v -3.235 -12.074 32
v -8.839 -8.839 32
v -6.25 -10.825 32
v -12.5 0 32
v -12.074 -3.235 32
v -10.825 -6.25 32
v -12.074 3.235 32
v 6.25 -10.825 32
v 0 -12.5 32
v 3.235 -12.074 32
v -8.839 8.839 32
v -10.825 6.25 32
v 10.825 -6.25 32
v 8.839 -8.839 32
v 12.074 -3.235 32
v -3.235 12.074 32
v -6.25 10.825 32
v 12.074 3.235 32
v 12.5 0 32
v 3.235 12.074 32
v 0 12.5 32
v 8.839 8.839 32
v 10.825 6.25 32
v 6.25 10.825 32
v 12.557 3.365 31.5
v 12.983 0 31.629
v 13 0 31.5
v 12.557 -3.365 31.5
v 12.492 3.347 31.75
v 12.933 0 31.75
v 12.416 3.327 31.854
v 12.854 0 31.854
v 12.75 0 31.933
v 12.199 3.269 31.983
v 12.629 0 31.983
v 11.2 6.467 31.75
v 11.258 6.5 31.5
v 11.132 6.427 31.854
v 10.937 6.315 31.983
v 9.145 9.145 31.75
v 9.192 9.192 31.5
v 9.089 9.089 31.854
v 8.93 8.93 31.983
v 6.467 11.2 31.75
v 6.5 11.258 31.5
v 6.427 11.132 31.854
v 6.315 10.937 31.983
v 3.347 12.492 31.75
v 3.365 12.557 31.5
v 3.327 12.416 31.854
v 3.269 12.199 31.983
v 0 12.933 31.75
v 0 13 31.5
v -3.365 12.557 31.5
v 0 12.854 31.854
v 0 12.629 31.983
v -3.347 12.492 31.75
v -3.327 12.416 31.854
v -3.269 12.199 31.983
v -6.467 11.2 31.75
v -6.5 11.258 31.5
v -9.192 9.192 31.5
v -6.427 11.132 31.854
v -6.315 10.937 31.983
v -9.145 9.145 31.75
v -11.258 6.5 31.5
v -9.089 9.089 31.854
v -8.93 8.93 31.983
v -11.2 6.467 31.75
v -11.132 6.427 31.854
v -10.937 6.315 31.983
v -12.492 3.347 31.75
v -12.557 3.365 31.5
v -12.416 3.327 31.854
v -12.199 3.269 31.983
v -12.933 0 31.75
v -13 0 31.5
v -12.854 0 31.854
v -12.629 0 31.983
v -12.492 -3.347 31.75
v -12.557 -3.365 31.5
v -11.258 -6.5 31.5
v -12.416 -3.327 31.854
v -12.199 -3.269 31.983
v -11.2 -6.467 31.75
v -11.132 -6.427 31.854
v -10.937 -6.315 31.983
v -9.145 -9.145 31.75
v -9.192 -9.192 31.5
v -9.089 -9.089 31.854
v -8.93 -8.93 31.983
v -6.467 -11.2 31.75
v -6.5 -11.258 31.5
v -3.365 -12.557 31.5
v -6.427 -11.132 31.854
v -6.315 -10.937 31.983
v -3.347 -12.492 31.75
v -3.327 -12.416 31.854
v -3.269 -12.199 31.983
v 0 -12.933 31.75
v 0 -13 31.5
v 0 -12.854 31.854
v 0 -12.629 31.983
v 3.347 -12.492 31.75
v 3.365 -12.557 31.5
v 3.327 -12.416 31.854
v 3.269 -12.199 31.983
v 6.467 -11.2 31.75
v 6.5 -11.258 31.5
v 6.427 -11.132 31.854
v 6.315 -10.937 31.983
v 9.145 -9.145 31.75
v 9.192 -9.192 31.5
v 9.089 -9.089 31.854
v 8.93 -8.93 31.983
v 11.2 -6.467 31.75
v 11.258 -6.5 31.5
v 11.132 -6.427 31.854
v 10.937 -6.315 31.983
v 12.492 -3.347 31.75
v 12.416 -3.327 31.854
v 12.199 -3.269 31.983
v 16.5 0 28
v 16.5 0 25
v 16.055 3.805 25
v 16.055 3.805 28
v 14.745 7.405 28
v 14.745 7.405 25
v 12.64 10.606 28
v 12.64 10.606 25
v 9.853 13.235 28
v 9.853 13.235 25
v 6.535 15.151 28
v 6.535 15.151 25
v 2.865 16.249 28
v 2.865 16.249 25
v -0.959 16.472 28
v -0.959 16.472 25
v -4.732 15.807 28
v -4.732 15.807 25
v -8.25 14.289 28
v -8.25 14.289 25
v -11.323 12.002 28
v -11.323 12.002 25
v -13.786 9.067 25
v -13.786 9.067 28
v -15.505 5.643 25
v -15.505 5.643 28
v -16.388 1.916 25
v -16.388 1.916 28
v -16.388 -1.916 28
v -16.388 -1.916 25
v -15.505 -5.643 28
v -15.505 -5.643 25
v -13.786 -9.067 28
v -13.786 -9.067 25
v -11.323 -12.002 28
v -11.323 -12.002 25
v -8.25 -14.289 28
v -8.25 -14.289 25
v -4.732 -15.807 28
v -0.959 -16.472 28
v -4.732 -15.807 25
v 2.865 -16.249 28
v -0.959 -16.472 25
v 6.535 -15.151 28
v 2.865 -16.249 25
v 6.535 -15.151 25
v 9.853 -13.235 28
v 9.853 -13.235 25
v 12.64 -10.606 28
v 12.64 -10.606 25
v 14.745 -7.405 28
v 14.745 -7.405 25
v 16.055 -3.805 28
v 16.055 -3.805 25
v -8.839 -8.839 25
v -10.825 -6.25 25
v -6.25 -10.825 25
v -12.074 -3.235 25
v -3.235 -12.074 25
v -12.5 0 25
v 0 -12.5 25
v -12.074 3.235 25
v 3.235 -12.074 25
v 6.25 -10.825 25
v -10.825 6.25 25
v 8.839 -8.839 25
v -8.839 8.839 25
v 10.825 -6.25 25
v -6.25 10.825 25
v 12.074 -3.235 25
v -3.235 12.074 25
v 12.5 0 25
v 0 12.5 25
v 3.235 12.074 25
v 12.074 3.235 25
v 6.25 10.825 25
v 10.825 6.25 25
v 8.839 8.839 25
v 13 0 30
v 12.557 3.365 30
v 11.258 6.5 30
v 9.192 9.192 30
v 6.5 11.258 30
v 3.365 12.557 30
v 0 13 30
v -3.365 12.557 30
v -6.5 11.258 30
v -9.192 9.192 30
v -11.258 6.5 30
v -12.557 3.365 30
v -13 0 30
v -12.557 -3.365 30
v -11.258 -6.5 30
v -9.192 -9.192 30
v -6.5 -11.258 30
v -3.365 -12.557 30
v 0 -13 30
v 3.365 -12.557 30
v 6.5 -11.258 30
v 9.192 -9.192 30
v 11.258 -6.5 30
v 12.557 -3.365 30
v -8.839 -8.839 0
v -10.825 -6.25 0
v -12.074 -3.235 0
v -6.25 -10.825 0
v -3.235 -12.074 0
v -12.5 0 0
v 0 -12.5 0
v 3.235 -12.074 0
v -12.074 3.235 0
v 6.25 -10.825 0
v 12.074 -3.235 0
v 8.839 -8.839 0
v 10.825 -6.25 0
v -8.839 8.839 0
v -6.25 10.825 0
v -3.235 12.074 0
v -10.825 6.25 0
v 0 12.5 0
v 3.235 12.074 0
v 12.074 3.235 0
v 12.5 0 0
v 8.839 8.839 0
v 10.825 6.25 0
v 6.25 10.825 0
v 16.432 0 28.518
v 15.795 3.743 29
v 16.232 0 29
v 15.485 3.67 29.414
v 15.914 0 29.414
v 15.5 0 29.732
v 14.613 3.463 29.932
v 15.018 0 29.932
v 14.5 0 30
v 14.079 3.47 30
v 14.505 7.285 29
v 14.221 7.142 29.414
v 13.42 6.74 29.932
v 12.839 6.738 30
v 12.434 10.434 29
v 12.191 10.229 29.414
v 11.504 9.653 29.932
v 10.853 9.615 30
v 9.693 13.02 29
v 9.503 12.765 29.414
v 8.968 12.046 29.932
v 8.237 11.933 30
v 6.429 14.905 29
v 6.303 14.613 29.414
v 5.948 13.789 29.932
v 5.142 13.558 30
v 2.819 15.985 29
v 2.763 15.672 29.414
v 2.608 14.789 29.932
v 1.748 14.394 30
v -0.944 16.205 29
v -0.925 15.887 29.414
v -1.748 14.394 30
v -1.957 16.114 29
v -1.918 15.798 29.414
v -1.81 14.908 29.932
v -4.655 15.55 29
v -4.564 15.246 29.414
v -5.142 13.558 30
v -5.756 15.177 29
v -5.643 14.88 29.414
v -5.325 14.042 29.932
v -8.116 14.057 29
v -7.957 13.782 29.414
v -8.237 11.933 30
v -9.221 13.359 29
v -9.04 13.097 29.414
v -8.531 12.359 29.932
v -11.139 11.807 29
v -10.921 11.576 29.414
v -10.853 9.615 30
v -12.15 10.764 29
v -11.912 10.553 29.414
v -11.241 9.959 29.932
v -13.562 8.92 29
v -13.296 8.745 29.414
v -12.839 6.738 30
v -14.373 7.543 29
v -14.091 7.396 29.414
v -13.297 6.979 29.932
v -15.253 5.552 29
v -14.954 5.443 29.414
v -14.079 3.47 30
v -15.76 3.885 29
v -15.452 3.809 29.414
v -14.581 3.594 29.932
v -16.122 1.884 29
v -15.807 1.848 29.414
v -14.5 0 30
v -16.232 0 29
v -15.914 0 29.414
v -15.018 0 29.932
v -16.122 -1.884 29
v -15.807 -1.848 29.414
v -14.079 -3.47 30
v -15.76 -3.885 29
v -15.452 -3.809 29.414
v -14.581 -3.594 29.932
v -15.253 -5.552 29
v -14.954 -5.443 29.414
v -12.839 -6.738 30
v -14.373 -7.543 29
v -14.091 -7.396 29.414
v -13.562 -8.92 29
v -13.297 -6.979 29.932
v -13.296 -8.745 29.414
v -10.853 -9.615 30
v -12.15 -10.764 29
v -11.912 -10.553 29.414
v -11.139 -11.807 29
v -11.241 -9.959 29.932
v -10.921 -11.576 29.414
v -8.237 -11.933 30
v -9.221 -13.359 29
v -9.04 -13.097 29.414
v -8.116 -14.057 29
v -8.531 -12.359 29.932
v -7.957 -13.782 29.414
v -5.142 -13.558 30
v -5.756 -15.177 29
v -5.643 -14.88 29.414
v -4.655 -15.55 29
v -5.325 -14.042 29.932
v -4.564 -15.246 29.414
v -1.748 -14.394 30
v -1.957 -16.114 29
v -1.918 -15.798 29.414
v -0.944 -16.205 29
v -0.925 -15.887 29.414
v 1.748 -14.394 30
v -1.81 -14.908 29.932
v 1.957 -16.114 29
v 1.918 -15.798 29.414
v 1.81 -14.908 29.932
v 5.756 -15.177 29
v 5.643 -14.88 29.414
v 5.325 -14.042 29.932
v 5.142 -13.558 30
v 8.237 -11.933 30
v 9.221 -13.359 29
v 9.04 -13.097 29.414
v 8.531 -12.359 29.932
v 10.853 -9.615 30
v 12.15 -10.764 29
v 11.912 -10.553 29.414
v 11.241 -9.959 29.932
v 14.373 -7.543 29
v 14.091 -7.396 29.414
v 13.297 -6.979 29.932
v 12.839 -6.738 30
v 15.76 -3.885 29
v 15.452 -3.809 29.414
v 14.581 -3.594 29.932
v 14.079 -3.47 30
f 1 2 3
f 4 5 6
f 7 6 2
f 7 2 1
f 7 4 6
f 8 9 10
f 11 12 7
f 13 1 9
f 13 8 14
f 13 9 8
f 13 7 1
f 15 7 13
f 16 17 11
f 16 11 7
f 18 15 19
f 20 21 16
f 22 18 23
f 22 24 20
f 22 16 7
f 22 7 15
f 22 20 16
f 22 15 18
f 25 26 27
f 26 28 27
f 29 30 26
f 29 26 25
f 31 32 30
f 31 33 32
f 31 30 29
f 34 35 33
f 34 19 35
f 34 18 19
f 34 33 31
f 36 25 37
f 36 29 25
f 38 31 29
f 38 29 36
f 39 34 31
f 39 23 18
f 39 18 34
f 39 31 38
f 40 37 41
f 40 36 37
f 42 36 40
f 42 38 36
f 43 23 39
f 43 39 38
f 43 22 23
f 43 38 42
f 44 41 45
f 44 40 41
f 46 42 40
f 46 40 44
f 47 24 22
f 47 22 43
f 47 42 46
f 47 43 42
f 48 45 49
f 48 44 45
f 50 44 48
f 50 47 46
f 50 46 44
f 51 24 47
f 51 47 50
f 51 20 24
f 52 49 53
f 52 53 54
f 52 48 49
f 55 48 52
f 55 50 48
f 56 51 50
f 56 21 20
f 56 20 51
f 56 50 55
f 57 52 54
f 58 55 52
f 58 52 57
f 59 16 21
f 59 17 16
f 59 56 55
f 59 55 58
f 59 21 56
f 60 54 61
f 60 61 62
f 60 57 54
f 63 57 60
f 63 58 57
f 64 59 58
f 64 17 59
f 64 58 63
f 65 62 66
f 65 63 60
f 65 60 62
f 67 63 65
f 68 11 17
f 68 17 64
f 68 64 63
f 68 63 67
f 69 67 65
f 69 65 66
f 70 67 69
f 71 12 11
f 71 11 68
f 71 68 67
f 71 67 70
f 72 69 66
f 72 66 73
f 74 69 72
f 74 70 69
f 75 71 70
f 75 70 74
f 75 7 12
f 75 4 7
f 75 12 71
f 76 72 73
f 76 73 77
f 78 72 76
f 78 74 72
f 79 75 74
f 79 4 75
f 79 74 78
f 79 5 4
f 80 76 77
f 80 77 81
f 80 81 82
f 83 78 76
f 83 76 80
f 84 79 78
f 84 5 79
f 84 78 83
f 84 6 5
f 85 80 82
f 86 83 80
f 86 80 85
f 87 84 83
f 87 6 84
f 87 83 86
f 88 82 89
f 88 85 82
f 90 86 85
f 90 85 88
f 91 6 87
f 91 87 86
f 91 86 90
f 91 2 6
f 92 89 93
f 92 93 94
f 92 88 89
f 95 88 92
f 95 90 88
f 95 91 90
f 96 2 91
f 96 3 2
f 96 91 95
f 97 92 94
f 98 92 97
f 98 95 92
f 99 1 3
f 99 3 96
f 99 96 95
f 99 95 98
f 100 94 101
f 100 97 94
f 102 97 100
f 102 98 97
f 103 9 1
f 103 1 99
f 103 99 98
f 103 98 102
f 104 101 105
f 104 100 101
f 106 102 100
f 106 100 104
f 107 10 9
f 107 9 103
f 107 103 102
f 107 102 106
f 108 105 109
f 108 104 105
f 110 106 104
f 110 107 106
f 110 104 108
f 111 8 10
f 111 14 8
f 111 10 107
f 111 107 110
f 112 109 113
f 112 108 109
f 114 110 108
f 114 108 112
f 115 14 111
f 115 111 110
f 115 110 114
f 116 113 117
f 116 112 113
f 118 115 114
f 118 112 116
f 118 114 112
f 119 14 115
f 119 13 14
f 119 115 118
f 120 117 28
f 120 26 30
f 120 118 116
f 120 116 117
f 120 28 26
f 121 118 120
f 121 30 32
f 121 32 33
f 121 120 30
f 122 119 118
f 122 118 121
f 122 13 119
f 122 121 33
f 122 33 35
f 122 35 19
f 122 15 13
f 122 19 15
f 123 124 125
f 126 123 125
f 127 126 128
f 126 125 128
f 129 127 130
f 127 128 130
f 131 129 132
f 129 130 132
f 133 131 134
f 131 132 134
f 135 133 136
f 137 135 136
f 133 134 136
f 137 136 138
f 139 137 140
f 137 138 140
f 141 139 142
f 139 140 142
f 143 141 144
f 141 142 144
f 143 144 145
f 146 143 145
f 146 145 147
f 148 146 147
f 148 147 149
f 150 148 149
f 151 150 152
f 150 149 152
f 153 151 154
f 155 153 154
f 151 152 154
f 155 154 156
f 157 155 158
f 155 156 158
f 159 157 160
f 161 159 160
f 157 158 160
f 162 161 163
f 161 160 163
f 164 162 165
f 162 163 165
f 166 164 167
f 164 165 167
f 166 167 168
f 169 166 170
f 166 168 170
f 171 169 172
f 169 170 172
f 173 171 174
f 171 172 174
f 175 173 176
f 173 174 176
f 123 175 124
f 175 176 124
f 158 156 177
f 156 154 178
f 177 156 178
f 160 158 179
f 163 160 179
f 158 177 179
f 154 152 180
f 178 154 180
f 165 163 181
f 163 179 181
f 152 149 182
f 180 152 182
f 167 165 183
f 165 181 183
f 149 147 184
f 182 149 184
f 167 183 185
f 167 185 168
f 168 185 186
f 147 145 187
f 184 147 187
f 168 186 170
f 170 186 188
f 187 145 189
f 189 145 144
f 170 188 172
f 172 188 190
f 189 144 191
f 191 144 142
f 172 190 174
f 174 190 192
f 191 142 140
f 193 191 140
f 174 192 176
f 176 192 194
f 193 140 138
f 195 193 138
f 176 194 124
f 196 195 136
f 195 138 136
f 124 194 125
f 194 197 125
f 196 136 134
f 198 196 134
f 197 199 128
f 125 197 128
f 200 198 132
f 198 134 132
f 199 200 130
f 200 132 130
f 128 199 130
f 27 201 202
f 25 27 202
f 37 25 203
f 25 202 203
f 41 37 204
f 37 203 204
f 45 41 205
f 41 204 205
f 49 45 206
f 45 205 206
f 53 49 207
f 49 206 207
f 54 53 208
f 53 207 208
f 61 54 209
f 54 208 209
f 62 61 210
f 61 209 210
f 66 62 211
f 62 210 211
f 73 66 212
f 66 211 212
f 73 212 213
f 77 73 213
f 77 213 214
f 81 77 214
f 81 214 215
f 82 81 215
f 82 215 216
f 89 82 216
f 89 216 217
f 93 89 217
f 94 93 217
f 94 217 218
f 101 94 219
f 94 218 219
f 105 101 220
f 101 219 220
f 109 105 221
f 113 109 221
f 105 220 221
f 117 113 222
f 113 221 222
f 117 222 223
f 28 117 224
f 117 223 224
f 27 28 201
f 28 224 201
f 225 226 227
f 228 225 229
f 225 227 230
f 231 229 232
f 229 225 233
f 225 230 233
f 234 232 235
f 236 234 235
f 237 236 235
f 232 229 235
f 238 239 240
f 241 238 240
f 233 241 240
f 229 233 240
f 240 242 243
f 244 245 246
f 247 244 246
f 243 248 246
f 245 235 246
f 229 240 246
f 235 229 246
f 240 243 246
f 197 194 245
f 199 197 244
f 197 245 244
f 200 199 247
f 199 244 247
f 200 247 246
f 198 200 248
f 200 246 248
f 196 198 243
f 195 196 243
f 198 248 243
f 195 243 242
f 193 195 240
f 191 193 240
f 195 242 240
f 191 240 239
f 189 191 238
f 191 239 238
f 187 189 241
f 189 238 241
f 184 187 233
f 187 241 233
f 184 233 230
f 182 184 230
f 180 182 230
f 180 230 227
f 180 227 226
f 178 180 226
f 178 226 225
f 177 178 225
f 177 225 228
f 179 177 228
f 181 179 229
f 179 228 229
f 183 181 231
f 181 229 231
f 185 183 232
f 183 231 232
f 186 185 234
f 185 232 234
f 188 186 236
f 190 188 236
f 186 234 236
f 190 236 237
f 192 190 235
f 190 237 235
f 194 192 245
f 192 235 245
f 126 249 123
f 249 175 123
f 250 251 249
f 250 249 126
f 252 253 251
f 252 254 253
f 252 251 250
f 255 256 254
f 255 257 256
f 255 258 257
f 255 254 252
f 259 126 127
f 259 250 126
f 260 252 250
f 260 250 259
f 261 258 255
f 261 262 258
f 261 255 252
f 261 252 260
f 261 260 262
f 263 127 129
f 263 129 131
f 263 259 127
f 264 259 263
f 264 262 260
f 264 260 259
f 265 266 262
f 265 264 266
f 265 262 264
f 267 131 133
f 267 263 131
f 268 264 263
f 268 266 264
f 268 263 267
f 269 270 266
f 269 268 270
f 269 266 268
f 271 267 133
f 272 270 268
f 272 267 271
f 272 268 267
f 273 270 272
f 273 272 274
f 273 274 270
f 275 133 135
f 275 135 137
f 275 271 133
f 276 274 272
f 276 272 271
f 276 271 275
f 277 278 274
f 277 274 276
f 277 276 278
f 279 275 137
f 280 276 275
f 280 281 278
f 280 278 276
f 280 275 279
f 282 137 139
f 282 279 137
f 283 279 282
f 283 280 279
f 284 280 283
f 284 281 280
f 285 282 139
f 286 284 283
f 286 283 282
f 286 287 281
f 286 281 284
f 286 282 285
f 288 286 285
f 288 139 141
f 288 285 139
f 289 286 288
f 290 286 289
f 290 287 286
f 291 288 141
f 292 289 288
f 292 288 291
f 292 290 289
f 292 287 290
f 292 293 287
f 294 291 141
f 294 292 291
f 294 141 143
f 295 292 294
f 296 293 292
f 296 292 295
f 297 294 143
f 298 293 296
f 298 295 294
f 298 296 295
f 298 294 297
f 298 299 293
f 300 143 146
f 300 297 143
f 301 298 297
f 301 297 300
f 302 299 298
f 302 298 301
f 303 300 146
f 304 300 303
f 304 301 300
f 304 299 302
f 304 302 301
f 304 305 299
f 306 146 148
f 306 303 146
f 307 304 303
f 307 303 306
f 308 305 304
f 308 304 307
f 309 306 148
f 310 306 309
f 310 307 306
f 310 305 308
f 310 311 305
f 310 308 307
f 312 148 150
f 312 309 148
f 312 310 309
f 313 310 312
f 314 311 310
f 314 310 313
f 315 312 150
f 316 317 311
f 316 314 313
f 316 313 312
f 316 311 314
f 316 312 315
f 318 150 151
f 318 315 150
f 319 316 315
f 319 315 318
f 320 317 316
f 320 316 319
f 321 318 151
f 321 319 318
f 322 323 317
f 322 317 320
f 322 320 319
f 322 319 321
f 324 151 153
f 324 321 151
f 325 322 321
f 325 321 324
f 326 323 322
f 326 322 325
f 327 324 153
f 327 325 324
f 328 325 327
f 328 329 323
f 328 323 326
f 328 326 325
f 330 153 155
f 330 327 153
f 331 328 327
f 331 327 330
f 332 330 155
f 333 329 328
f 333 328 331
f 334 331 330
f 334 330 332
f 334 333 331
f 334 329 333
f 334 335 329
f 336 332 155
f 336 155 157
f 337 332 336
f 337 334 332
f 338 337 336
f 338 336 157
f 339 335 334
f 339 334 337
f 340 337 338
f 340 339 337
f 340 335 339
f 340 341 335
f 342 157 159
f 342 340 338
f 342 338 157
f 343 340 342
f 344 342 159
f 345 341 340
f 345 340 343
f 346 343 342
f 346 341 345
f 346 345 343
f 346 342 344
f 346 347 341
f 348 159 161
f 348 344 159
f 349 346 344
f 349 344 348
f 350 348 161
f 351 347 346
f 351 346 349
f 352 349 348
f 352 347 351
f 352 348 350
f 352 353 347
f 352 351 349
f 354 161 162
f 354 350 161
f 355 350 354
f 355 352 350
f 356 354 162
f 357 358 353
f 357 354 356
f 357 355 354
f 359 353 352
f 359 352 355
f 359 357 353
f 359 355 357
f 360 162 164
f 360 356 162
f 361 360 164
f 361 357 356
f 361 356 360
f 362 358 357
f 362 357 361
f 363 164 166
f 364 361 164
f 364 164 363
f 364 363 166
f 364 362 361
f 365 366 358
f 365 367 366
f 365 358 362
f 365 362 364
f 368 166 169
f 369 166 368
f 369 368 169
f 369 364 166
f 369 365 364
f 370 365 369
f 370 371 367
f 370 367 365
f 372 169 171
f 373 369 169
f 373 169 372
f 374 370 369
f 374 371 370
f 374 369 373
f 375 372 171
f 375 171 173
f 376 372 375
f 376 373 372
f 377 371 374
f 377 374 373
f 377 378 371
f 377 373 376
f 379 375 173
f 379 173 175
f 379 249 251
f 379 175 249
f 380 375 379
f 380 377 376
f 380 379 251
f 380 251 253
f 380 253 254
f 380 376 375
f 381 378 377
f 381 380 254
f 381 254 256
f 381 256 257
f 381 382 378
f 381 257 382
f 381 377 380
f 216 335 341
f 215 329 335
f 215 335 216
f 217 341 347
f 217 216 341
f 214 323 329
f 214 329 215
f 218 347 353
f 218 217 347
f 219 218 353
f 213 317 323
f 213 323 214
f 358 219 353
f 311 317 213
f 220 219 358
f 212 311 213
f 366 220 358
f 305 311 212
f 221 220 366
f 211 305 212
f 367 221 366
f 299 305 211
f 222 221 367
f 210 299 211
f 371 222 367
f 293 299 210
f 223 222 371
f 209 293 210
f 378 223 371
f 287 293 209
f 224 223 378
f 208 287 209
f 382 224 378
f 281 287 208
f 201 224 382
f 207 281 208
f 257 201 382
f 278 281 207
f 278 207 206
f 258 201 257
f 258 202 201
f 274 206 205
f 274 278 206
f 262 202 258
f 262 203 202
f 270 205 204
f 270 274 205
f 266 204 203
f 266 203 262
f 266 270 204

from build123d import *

# Parameters (mm, degrees)
SKETCH_R     = 12.5
PAD_DEPTH    = 25
SKETCH001_R  = 16.5
PAD001_DEPTH = 5
SKETCH002_R  = 13
PAD002_DEPTH = 2
FILLET_R     = 2
FILLET001_R  = 0.5


with BuildPart() as part:
    # Sketch → Pad (new body)
    with BuildSketch(Plane.XY):
        Circle(SKETCH_R)
    extrude(amount=PAD_DEPTH)

    # Sketch001 (on Face3 of Pad) → Pad001 (join)
    with BuildSketch(Plane.XY.offset(25)):
        Circle(SKETCH001_R)
    extrude(amount=PAD001_DEPTH)

    # Sketch002 (on Face3 of Pad001) → Pad002 (join)
    with BuildSketch(Plane.XY.offset(30)):
        Circle(SKETCH002_R)
    extrude(amount=PAD002_DEPTH)

    # Fillet
    fillet_edges = [part.edges().sort_by_distance(p)[0] for p in [
        (-16.5, 0, 30),
    ]]
    fillet(fillet_edges, radius=FILLET_R)

    # Fillet001
    fillet001_edges = [part.edges().sort_by_distance(p)[0] for p in [
        (-13, 0, 32),
    ]]
    fillet(fillet001_edges, radius=FILLET001_R)


solid = part.part
